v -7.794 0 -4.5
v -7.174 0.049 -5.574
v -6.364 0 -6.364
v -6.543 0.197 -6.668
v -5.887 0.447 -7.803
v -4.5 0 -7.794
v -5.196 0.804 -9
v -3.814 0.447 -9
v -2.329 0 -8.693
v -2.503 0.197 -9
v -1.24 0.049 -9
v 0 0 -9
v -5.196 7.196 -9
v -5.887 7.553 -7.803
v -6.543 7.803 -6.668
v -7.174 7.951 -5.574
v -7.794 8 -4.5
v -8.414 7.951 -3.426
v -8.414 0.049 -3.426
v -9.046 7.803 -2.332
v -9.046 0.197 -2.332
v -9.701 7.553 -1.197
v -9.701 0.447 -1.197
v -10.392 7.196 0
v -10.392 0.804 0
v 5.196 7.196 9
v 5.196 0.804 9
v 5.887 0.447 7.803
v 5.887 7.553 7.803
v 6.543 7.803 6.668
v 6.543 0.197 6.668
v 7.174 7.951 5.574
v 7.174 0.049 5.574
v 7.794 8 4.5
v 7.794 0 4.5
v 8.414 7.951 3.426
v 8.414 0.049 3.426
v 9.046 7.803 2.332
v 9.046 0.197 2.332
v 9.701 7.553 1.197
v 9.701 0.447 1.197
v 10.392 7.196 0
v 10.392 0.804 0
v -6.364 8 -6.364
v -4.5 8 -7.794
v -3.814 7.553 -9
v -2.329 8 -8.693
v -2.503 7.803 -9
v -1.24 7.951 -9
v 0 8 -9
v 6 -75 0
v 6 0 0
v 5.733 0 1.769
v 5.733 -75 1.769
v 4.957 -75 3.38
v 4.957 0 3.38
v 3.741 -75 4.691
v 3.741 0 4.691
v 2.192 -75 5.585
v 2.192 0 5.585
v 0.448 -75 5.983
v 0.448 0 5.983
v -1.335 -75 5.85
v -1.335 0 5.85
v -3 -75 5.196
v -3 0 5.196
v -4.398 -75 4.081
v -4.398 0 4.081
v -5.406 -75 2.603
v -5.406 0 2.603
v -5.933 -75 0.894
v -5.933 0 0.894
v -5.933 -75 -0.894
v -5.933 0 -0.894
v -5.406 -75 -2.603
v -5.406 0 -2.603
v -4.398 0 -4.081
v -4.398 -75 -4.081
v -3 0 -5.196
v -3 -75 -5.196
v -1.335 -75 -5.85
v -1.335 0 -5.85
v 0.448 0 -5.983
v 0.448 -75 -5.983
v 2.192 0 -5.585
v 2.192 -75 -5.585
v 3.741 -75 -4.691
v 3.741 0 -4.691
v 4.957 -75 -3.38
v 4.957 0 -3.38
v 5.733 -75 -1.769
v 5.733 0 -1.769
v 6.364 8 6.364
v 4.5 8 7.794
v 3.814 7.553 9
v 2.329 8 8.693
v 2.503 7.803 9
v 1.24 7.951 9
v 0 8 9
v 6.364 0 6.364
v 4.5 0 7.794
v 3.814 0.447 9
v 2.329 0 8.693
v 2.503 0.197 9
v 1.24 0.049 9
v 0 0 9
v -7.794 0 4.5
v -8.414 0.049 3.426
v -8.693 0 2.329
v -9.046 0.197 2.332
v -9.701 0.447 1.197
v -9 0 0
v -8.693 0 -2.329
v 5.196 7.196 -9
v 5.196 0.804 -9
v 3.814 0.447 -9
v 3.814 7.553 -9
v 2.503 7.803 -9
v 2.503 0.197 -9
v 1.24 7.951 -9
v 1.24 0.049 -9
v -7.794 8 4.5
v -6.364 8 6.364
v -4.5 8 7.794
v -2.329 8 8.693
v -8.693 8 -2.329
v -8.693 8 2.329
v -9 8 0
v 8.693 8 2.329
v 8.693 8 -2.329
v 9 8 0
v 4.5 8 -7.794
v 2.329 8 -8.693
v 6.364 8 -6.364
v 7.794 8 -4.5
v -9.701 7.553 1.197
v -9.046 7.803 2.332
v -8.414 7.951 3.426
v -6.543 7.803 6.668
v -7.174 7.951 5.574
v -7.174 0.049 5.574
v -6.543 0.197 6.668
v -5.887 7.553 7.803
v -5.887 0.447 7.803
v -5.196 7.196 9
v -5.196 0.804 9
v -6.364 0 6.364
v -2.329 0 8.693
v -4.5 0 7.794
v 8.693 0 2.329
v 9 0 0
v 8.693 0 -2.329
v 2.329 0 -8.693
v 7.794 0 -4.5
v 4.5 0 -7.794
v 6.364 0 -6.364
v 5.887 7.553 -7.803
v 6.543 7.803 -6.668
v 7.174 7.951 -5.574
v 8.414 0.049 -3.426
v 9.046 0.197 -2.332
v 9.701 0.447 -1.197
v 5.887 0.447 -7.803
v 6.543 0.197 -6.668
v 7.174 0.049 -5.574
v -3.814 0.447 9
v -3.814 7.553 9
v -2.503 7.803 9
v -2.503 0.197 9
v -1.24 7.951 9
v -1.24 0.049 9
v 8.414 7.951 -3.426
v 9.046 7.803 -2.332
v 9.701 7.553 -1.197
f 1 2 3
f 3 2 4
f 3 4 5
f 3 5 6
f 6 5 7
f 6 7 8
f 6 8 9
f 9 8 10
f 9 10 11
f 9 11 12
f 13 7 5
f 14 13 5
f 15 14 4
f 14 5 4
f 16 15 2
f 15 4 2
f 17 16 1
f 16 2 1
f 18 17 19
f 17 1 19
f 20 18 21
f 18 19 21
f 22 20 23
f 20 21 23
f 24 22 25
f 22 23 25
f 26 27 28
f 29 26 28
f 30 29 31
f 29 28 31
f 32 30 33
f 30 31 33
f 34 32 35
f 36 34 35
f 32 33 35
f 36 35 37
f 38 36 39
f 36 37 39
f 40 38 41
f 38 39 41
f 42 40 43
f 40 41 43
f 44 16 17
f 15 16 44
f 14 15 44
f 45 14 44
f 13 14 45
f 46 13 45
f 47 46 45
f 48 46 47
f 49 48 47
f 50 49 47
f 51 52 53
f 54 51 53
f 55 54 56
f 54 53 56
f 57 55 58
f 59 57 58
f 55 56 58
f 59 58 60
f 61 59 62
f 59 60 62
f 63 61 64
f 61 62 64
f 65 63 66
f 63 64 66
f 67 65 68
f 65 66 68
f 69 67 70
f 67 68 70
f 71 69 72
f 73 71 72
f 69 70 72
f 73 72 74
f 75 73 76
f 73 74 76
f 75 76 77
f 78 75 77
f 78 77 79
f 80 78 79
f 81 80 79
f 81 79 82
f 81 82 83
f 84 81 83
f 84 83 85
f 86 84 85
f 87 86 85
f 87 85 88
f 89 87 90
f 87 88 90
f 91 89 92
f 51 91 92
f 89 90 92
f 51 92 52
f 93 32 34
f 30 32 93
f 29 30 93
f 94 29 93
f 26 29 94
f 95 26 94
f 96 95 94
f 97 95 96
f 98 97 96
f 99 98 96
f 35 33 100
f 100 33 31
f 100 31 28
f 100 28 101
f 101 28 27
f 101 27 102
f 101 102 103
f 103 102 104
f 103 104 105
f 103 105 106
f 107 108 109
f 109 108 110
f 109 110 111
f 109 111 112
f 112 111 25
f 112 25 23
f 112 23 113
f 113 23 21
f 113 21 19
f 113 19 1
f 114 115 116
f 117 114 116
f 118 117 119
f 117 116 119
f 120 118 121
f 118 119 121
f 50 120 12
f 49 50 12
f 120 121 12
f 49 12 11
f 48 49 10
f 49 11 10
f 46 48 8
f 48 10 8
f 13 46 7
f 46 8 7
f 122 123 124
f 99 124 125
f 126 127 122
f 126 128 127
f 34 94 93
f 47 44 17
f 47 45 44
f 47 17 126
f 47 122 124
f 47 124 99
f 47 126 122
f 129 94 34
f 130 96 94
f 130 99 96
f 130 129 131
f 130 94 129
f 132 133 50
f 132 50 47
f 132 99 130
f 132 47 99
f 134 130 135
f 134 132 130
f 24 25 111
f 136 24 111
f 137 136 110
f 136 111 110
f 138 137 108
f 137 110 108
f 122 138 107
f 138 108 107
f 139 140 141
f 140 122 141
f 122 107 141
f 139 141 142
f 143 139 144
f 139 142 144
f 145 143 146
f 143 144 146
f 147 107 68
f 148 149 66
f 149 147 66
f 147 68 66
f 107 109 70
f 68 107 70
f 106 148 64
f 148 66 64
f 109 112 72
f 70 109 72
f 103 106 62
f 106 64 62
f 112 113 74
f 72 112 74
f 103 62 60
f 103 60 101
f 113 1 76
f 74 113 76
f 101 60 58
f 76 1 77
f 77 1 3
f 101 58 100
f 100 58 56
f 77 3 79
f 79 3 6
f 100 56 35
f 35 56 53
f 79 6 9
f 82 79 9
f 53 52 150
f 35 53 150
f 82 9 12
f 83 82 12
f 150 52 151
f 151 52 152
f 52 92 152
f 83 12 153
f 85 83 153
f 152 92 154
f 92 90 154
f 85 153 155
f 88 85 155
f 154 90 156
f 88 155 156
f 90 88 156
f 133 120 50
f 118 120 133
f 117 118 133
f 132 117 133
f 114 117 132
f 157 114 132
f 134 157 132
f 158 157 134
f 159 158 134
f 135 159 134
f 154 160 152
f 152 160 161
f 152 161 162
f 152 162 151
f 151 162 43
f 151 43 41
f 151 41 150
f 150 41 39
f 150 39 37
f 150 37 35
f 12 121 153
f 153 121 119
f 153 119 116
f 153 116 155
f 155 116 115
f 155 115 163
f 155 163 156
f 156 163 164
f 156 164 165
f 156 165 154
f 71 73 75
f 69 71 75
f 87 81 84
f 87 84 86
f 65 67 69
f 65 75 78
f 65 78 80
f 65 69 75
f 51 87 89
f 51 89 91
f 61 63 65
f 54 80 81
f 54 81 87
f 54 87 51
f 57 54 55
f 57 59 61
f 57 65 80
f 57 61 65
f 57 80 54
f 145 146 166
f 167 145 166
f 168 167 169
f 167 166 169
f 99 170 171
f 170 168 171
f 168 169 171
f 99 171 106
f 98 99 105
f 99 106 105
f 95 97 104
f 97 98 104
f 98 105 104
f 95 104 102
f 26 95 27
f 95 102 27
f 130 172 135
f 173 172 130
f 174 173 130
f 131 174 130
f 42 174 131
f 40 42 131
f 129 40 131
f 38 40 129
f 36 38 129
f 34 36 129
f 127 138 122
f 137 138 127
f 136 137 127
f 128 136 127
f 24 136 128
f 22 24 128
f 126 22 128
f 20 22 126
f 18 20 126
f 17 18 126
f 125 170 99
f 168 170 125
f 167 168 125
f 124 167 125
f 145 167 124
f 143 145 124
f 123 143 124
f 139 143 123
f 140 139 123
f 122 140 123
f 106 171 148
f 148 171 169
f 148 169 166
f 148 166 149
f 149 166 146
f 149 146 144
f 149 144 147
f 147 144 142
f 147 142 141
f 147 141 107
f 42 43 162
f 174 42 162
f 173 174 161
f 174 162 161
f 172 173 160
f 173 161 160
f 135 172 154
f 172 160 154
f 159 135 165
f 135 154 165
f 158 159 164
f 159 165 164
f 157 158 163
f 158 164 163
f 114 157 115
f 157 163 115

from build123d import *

# Parameters (mm, degrees)
BOSS_EXTRUDE1_DEPTH = 8
SKETCH3_R           = 6
BOSS_EXTRUDE2_DEPTH = 75


with BuildPart() as part:
    # Sketch1 → Boss-Extrude1 (new body)
    with BuildSketch(Plane(origin=(0, 0, 0), x_dir=(1, 0, 0), z_dir=(0, 1, 0))):
        Polygon((5.196152423, 9), (-5.196152423, 9), (-10.392304845, 0), (-5.196152423, -9), (5.196152423, -9), (10.392304845, 0), align=None)
    extrude(amount=BOSS_EXTRUDE1_DEPTH)

    # Sketch2 → Cut-Revolve1 (revolve, cut)
    with BuildSketch(Plane.XY):
        Polygon((-10.392304845, 0), (-9, 0), (-10.392304845, 0.803847577), align=None)
        Polygon((-10.392304845, 8), (-9, 8), (-10.392304845, 7.196152423), align=None)
    revolve(axis=Axis((0, 55, 0), (0, -1, 0)), mode=Mode.SUBTRACT)

    # Sketch3 → Boss-Extrude2 (add)
    with BuildSketch(Plane.XZ):
        Circle(SKETCH3_R)
    extrude(amount=BOSS_EXTRUDE2_DEPTH)


solid = part.part
